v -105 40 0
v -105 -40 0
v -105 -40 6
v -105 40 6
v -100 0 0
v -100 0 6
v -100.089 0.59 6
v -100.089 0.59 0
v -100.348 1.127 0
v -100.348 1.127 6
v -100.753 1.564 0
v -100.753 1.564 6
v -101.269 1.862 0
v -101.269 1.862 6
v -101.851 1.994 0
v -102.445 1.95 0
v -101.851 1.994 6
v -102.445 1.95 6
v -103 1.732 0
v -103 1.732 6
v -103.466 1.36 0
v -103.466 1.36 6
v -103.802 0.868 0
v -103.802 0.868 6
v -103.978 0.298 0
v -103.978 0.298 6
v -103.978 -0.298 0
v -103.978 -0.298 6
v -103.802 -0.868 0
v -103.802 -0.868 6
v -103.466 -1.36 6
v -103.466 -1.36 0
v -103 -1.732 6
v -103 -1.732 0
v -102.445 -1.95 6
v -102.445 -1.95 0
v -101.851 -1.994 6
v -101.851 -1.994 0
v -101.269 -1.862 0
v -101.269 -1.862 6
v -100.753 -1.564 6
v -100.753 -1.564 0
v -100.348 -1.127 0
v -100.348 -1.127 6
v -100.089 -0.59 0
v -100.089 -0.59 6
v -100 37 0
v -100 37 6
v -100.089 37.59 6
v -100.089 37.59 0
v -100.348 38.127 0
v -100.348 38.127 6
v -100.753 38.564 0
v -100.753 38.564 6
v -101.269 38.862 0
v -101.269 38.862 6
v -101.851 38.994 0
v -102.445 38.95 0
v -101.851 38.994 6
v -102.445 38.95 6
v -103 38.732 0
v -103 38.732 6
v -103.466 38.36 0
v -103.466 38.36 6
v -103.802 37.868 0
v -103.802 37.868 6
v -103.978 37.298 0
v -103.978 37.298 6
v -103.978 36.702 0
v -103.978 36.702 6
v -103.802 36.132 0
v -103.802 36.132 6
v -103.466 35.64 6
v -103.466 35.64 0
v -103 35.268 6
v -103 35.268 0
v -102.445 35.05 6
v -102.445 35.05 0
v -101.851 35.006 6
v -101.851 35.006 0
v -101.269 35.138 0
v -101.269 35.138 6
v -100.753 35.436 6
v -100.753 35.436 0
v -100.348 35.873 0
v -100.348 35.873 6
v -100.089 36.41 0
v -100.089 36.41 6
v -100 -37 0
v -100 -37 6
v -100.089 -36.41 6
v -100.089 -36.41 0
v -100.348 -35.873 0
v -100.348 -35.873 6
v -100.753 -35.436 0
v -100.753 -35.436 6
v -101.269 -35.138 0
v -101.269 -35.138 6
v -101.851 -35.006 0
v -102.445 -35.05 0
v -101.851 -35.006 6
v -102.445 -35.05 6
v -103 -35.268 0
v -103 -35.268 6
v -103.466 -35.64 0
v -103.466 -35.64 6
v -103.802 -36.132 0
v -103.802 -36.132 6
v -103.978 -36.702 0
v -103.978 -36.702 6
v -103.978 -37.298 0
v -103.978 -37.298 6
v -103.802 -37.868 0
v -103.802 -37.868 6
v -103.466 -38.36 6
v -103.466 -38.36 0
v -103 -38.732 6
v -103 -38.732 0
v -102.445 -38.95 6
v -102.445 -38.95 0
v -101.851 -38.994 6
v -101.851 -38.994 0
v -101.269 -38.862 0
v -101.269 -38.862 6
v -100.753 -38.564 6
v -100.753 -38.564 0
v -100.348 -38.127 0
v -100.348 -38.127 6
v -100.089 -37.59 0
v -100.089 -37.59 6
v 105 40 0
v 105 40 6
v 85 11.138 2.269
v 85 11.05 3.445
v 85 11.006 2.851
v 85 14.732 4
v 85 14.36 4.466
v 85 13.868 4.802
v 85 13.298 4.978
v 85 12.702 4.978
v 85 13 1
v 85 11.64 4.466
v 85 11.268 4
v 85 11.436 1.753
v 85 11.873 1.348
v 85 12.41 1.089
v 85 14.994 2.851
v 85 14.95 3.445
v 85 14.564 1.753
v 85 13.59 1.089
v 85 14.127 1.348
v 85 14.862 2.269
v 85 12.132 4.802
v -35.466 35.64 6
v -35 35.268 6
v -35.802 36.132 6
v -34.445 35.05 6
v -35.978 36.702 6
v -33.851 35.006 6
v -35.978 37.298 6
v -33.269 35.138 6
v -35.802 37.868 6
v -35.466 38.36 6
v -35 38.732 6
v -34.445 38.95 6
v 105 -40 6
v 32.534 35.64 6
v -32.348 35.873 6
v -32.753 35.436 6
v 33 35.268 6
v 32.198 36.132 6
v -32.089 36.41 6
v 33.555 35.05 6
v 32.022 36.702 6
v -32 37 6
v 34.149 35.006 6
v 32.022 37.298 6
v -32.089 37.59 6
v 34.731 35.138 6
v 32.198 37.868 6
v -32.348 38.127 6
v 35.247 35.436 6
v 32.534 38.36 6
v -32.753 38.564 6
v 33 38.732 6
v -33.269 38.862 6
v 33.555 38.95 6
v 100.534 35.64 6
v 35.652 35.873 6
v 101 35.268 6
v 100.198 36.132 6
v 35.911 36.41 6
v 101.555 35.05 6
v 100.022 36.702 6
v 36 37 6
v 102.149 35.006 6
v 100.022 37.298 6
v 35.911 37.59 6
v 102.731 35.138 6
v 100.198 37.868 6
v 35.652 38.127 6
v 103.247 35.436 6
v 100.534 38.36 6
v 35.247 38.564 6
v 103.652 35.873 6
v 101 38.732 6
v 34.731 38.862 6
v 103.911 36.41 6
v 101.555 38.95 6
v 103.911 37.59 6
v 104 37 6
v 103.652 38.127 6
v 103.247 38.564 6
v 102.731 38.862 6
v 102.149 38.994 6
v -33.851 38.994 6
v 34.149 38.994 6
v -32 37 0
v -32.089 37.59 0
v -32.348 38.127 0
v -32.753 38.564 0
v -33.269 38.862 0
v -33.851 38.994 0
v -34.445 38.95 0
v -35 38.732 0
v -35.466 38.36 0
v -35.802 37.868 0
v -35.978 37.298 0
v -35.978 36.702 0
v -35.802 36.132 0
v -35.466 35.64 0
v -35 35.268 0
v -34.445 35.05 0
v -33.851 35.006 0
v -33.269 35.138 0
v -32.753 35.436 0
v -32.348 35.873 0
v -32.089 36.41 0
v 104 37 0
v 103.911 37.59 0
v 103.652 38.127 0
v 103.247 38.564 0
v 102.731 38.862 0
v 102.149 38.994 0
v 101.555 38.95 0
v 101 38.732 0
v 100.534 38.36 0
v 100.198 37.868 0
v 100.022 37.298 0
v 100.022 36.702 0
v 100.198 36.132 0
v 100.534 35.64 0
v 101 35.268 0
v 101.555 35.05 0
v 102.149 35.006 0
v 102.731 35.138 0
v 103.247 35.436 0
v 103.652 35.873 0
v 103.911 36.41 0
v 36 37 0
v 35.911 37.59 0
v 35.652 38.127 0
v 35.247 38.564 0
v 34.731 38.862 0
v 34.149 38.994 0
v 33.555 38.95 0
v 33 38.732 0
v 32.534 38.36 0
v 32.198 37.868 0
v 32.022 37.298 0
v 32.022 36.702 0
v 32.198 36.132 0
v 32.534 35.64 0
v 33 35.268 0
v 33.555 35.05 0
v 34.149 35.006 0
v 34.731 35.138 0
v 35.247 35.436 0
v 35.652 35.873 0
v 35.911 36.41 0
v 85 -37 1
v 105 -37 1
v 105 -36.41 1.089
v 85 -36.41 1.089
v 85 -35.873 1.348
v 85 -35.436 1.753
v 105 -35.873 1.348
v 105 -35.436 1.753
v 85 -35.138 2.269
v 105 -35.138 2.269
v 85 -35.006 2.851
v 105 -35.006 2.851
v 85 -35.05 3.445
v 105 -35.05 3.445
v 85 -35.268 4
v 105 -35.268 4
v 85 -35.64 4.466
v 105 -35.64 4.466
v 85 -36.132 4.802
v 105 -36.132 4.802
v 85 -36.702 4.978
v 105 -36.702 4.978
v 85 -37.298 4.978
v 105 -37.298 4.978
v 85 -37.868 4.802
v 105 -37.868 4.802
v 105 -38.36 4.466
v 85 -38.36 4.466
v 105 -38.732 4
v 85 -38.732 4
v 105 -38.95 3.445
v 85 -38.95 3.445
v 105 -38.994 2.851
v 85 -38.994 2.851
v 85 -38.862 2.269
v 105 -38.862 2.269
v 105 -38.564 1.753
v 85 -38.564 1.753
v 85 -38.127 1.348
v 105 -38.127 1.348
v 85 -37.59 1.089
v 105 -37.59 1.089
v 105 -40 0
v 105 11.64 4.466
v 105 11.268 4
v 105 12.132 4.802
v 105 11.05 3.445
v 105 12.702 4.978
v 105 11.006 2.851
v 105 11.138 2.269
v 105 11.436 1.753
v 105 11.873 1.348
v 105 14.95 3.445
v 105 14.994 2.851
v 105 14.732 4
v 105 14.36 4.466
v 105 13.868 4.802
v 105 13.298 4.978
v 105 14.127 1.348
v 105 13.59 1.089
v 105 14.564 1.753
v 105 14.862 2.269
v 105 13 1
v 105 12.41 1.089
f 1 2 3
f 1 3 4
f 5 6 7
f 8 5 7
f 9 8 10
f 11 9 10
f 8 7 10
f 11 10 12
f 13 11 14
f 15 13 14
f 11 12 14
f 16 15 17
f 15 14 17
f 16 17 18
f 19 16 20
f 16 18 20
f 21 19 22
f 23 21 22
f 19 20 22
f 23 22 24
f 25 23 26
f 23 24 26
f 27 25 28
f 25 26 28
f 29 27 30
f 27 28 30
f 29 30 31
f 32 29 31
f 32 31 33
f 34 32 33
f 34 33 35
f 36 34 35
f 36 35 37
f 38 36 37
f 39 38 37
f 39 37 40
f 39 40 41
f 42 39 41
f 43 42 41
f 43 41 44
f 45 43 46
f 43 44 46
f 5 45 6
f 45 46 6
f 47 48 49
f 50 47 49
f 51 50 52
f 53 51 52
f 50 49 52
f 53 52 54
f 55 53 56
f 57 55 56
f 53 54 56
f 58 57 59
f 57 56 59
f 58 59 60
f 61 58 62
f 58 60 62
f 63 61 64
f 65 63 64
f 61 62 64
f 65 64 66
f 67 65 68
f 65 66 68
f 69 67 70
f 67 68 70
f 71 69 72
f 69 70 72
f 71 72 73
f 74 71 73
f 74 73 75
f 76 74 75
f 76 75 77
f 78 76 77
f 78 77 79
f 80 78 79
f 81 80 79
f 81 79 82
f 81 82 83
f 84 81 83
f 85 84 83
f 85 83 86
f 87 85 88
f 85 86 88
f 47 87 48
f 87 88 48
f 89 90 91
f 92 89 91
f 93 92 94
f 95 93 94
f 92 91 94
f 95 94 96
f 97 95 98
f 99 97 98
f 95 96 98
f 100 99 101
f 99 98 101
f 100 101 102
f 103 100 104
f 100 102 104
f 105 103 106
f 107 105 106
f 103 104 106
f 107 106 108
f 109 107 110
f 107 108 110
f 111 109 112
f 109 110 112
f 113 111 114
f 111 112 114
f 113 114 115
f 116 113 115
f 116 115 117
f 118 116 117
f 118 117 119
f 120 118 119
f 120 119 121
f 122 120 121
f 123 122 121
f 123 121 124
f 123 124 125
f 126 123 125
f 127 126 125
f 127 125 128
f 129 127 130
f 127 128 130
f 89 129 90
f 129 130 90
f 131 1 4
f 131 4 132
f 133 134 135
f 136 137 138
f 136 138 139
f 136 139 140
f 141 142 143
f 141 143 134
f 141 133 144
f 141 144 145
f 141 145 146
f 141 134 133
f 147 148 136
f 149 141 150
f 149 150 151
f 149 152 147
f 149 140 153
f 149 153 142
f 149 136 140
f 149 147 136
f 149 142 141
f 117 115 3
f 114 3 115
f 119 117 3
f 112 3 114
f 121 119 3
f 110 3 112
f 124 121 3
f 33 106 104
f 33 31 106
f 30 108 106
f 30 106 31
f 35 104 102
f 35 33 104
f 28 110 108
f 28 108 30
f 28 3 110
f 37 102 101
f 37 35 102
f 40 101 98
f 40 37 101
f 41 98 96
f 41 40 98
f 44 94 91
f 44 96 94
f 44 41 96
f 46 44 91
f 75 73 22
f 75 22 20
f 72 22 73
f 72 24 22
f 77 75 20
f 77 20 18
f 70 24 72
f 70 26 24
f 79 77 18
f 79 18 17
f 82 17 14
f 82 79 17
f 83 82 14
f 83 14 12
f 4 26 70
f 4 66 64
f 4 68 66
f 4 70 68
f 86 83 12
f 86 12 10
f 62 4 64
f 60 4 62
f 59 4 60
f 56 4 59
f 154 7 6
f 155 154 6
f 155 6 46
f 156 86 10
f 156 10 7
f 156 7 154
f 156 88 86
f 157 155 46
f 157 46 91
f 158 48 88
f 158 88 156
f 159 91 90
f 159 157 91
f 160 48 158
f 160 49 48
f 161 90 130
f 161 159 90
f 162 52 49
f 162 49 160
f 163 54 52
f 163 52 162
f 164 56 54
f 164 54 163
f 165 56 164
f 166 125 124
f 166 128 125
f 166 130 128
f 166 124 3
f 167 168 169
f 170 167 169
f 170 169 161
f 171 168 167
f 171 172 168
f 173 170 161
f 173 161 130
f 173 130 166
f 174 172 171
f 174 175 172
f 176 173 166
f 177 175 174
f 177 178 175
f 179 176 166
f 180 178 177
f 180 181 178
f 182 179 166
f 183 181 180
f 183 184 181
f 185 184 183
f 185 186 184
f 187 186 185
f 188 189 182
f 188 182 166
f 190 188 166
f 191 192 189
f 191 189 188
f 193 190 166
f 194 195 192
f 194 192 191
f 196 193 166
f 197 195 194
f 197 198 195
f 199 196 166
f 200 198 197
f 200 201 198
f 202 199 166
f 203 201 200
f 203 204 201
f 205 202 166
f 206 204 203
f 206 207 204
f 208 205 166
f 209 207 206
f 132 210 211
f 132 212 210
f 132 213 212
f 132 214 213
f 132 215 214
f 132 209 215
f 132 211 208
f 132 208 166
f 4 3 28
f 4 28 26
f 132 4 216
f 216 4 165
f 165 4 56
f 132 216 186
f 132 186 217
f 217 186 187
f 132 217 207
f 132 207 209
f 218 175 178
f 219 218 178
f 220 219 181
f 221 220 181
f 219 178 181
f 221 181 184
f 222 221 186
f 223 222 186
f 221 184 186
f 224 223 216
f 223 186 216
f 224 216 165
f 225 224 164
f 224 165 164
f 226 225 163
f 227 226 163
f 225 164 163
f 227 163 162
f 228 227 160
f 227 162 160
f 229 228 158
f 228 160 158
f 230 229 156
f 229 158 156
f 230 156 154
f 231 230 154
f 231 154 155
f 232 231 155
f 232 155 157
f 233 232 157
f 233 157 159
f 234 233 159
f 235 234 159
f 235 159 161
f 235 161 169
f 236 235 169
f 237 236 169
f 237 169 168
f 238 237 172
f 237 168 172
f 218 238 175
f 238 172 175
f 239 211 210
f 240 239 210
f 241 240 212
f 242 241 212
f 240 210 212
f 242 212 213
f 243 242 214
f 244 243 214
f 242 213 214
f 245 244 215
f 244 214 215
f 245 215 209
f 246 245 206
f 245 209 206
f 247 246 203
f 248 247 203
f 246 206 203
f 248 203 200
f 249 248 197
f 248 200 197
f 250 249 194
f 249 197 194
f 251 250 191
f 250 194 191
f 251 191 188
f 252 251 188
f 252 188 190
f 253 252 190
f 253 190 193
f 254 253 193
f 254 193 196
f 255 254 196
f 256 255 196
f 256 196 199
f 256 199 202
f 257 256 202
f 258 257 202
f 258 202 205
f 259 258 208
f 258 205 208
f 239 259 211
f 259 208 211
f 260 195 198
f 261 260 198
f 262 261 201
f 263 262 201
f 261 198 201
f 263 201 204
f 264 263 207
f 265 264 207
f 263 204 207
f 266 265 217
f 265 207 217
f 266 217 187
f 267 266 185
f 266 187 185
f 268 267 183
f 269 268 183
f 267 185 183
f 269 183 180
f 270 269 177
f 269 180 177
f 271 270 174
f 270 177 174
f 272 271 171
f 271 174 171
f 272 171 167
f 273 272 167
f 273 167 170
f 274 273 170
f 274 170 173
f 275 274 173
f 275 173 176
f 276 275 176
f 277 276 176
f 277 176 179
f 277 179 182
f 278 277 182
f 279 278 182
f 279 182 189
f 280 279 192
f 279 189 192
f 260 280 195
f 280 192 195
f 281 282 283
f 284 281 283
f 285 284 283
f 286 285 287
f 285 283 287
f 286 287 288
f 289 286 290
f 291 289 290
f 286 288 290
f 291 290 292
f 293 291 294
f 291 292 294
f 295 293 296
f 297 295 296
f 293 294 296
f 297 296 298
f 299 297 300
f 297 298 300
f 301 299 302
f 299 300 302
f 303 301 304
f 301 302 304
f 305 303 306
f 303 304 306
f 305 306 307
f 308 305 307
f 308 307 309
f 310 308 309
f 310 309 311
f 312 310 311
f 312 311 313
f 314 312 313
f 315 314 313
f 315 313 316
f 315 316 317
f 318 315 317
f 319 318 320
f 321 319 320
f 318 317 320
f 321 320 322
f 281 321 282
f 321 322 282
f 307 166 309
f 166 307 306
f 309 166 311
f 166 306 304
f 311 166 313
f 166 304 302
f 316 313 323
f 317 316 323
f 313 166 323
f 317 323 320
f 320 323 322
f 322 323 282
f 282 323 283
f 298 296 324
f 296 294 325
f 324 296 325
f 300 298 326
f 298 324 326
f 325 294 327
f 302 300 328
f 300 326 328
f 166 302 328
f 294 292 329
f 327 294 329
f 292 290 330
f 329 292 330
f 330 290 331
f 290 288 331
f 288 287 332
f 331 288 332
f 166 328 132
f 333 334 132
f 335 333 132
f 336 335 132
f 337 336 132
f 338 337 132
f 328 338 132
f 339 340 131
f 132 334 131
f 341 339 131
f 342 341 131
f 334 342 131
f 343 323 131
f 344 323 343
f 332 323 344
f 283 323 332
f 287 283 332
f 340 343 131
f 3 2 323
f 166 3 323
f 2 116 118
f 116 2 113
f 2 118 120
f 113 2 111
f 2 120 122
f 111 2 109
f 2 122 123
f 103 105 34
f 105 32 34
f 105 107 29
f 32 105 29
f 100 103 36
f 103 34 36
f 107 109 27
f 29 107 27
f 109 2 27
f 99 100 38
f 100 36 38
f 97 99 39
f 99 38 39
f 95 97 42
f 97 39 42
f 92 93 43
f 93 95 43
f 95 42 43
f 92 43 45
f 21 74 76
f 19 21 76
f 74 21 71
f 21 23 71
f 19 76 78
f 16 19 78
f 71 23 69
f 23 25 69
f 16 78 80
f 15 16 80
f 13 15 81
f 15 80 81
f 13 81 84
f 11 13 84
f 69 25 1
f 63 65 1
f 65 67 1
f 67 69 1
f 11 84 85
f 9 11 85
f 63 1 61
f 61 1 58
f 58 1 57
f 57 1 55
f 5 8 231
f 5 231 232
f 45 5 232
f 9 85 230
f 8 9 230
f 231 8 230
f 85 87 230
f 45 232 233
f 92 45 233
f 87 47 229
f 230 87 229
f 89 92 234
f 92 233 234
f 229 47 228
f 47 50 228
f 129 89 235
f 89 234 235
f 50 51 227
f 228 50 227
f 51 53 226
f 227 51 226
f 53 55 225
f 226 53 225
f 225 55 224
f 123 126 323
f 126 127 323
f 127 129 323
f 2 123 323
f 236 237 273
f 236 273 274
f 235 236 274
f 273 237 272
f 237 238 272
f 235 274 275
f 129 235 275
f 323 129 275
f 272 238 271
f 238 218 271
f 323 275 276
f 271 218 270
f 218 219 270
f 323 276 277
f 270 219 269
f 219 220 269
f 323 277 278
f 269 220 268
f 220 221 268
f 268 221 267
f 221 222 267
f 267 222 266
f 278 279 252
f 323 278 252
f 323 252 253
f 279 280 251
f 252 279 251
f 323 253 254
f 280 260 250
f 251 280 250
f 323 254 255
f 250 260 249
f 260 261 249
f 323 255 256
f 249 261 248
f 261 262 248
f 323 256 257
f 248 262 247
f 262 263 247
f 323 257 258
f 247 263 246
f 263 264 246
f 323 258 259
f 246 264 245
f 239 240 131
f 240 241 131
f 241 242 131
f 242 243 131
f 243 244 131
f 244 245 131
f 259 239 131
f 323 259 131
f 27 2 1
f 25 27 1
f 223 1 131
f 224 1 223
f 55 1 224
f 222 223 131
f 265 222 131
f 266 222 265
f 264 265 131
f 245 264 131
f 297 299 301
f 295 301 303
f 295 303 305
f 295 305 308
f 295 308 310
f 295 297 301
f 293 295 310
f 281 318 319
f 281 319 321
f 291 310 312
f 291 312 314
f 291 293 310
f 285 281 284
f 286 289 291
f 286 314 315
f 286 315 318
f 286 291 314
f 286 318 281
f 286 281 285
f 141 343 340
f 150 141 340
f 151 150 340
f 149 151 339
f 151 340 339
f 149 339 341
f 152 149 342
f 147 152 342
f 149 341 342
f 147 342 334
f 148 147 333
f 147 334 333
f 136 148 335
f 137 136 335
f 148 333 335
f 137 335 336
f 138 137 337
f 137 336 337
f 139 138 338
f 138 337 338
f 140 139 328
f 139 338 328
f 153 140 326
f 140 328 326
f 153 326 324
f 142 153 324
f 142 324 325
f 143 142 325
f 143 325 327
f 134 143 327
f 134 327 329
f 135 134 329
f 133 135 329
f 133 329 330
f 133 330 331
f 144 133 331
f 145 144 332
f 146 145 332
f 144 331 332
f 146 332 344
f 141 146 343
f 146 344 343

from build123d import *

# Parameters (mm, degrees)
SKETCH_1_W          = 210
SKETCH_1_H          = 80
EXTRUDE_1_DEPTH     = 6
SKETCH_2_R          = 2
CUT_EXTRUDE_1_DEPTH = 6
SKETCH_3_R          = 2
CUT_EXTRUDE_2_DEPTH = 20


with BuildPart() as part:
    # 草图1 → 凸台-拉伸1 (new body)
    with BuildSketch(Plane.XY):
        Rectangle(SKETCH_1_W, SKETCH_1_H)
    extrude(amount=EXTRUDE_1_DEPTH)

    # 草图2 → 切除-拉伸1 (cut)
    with BuildSketch(Plane.XY.offset(6)):
        with Locations((-102, 0)):
            Circle(SKETCH_2_R)
        with Locations((-102, 37)):
            Circle(SKETCH_2_R)
        with Locations((-102, -37)):
            Circle(SKETCH_2_R)
        with Locations((-34, 37)):
            Circle(SKETCH_2_R)
        with Locations((34, 37)):
            Circle(SKETCH_2_R)
        with Locations((102, 37)):
            Circle(SKETCH_2_R)
    extrude(amount=-CUT_EXTRUDE_1_DEPTH, mode=Mode.SUBTRACT)

    # 草图3 → 切除-拉伸2 (cut)
    with BuildSketch(Plane(origin=(105, 0, 0), x_dir=(0, 0, -1), z_dir=(1, 0, 0))):
        with Locations((-3, -37)):
            Circle(SKETCH_3_R)
        with Locations((-3, 13)):
            Circle(SKETCH_3_R)
    extrude(amount=-CUT_EXTRUDE_2_DEPTH, mode=Mode.SUBTRACT)


solid = part.part
